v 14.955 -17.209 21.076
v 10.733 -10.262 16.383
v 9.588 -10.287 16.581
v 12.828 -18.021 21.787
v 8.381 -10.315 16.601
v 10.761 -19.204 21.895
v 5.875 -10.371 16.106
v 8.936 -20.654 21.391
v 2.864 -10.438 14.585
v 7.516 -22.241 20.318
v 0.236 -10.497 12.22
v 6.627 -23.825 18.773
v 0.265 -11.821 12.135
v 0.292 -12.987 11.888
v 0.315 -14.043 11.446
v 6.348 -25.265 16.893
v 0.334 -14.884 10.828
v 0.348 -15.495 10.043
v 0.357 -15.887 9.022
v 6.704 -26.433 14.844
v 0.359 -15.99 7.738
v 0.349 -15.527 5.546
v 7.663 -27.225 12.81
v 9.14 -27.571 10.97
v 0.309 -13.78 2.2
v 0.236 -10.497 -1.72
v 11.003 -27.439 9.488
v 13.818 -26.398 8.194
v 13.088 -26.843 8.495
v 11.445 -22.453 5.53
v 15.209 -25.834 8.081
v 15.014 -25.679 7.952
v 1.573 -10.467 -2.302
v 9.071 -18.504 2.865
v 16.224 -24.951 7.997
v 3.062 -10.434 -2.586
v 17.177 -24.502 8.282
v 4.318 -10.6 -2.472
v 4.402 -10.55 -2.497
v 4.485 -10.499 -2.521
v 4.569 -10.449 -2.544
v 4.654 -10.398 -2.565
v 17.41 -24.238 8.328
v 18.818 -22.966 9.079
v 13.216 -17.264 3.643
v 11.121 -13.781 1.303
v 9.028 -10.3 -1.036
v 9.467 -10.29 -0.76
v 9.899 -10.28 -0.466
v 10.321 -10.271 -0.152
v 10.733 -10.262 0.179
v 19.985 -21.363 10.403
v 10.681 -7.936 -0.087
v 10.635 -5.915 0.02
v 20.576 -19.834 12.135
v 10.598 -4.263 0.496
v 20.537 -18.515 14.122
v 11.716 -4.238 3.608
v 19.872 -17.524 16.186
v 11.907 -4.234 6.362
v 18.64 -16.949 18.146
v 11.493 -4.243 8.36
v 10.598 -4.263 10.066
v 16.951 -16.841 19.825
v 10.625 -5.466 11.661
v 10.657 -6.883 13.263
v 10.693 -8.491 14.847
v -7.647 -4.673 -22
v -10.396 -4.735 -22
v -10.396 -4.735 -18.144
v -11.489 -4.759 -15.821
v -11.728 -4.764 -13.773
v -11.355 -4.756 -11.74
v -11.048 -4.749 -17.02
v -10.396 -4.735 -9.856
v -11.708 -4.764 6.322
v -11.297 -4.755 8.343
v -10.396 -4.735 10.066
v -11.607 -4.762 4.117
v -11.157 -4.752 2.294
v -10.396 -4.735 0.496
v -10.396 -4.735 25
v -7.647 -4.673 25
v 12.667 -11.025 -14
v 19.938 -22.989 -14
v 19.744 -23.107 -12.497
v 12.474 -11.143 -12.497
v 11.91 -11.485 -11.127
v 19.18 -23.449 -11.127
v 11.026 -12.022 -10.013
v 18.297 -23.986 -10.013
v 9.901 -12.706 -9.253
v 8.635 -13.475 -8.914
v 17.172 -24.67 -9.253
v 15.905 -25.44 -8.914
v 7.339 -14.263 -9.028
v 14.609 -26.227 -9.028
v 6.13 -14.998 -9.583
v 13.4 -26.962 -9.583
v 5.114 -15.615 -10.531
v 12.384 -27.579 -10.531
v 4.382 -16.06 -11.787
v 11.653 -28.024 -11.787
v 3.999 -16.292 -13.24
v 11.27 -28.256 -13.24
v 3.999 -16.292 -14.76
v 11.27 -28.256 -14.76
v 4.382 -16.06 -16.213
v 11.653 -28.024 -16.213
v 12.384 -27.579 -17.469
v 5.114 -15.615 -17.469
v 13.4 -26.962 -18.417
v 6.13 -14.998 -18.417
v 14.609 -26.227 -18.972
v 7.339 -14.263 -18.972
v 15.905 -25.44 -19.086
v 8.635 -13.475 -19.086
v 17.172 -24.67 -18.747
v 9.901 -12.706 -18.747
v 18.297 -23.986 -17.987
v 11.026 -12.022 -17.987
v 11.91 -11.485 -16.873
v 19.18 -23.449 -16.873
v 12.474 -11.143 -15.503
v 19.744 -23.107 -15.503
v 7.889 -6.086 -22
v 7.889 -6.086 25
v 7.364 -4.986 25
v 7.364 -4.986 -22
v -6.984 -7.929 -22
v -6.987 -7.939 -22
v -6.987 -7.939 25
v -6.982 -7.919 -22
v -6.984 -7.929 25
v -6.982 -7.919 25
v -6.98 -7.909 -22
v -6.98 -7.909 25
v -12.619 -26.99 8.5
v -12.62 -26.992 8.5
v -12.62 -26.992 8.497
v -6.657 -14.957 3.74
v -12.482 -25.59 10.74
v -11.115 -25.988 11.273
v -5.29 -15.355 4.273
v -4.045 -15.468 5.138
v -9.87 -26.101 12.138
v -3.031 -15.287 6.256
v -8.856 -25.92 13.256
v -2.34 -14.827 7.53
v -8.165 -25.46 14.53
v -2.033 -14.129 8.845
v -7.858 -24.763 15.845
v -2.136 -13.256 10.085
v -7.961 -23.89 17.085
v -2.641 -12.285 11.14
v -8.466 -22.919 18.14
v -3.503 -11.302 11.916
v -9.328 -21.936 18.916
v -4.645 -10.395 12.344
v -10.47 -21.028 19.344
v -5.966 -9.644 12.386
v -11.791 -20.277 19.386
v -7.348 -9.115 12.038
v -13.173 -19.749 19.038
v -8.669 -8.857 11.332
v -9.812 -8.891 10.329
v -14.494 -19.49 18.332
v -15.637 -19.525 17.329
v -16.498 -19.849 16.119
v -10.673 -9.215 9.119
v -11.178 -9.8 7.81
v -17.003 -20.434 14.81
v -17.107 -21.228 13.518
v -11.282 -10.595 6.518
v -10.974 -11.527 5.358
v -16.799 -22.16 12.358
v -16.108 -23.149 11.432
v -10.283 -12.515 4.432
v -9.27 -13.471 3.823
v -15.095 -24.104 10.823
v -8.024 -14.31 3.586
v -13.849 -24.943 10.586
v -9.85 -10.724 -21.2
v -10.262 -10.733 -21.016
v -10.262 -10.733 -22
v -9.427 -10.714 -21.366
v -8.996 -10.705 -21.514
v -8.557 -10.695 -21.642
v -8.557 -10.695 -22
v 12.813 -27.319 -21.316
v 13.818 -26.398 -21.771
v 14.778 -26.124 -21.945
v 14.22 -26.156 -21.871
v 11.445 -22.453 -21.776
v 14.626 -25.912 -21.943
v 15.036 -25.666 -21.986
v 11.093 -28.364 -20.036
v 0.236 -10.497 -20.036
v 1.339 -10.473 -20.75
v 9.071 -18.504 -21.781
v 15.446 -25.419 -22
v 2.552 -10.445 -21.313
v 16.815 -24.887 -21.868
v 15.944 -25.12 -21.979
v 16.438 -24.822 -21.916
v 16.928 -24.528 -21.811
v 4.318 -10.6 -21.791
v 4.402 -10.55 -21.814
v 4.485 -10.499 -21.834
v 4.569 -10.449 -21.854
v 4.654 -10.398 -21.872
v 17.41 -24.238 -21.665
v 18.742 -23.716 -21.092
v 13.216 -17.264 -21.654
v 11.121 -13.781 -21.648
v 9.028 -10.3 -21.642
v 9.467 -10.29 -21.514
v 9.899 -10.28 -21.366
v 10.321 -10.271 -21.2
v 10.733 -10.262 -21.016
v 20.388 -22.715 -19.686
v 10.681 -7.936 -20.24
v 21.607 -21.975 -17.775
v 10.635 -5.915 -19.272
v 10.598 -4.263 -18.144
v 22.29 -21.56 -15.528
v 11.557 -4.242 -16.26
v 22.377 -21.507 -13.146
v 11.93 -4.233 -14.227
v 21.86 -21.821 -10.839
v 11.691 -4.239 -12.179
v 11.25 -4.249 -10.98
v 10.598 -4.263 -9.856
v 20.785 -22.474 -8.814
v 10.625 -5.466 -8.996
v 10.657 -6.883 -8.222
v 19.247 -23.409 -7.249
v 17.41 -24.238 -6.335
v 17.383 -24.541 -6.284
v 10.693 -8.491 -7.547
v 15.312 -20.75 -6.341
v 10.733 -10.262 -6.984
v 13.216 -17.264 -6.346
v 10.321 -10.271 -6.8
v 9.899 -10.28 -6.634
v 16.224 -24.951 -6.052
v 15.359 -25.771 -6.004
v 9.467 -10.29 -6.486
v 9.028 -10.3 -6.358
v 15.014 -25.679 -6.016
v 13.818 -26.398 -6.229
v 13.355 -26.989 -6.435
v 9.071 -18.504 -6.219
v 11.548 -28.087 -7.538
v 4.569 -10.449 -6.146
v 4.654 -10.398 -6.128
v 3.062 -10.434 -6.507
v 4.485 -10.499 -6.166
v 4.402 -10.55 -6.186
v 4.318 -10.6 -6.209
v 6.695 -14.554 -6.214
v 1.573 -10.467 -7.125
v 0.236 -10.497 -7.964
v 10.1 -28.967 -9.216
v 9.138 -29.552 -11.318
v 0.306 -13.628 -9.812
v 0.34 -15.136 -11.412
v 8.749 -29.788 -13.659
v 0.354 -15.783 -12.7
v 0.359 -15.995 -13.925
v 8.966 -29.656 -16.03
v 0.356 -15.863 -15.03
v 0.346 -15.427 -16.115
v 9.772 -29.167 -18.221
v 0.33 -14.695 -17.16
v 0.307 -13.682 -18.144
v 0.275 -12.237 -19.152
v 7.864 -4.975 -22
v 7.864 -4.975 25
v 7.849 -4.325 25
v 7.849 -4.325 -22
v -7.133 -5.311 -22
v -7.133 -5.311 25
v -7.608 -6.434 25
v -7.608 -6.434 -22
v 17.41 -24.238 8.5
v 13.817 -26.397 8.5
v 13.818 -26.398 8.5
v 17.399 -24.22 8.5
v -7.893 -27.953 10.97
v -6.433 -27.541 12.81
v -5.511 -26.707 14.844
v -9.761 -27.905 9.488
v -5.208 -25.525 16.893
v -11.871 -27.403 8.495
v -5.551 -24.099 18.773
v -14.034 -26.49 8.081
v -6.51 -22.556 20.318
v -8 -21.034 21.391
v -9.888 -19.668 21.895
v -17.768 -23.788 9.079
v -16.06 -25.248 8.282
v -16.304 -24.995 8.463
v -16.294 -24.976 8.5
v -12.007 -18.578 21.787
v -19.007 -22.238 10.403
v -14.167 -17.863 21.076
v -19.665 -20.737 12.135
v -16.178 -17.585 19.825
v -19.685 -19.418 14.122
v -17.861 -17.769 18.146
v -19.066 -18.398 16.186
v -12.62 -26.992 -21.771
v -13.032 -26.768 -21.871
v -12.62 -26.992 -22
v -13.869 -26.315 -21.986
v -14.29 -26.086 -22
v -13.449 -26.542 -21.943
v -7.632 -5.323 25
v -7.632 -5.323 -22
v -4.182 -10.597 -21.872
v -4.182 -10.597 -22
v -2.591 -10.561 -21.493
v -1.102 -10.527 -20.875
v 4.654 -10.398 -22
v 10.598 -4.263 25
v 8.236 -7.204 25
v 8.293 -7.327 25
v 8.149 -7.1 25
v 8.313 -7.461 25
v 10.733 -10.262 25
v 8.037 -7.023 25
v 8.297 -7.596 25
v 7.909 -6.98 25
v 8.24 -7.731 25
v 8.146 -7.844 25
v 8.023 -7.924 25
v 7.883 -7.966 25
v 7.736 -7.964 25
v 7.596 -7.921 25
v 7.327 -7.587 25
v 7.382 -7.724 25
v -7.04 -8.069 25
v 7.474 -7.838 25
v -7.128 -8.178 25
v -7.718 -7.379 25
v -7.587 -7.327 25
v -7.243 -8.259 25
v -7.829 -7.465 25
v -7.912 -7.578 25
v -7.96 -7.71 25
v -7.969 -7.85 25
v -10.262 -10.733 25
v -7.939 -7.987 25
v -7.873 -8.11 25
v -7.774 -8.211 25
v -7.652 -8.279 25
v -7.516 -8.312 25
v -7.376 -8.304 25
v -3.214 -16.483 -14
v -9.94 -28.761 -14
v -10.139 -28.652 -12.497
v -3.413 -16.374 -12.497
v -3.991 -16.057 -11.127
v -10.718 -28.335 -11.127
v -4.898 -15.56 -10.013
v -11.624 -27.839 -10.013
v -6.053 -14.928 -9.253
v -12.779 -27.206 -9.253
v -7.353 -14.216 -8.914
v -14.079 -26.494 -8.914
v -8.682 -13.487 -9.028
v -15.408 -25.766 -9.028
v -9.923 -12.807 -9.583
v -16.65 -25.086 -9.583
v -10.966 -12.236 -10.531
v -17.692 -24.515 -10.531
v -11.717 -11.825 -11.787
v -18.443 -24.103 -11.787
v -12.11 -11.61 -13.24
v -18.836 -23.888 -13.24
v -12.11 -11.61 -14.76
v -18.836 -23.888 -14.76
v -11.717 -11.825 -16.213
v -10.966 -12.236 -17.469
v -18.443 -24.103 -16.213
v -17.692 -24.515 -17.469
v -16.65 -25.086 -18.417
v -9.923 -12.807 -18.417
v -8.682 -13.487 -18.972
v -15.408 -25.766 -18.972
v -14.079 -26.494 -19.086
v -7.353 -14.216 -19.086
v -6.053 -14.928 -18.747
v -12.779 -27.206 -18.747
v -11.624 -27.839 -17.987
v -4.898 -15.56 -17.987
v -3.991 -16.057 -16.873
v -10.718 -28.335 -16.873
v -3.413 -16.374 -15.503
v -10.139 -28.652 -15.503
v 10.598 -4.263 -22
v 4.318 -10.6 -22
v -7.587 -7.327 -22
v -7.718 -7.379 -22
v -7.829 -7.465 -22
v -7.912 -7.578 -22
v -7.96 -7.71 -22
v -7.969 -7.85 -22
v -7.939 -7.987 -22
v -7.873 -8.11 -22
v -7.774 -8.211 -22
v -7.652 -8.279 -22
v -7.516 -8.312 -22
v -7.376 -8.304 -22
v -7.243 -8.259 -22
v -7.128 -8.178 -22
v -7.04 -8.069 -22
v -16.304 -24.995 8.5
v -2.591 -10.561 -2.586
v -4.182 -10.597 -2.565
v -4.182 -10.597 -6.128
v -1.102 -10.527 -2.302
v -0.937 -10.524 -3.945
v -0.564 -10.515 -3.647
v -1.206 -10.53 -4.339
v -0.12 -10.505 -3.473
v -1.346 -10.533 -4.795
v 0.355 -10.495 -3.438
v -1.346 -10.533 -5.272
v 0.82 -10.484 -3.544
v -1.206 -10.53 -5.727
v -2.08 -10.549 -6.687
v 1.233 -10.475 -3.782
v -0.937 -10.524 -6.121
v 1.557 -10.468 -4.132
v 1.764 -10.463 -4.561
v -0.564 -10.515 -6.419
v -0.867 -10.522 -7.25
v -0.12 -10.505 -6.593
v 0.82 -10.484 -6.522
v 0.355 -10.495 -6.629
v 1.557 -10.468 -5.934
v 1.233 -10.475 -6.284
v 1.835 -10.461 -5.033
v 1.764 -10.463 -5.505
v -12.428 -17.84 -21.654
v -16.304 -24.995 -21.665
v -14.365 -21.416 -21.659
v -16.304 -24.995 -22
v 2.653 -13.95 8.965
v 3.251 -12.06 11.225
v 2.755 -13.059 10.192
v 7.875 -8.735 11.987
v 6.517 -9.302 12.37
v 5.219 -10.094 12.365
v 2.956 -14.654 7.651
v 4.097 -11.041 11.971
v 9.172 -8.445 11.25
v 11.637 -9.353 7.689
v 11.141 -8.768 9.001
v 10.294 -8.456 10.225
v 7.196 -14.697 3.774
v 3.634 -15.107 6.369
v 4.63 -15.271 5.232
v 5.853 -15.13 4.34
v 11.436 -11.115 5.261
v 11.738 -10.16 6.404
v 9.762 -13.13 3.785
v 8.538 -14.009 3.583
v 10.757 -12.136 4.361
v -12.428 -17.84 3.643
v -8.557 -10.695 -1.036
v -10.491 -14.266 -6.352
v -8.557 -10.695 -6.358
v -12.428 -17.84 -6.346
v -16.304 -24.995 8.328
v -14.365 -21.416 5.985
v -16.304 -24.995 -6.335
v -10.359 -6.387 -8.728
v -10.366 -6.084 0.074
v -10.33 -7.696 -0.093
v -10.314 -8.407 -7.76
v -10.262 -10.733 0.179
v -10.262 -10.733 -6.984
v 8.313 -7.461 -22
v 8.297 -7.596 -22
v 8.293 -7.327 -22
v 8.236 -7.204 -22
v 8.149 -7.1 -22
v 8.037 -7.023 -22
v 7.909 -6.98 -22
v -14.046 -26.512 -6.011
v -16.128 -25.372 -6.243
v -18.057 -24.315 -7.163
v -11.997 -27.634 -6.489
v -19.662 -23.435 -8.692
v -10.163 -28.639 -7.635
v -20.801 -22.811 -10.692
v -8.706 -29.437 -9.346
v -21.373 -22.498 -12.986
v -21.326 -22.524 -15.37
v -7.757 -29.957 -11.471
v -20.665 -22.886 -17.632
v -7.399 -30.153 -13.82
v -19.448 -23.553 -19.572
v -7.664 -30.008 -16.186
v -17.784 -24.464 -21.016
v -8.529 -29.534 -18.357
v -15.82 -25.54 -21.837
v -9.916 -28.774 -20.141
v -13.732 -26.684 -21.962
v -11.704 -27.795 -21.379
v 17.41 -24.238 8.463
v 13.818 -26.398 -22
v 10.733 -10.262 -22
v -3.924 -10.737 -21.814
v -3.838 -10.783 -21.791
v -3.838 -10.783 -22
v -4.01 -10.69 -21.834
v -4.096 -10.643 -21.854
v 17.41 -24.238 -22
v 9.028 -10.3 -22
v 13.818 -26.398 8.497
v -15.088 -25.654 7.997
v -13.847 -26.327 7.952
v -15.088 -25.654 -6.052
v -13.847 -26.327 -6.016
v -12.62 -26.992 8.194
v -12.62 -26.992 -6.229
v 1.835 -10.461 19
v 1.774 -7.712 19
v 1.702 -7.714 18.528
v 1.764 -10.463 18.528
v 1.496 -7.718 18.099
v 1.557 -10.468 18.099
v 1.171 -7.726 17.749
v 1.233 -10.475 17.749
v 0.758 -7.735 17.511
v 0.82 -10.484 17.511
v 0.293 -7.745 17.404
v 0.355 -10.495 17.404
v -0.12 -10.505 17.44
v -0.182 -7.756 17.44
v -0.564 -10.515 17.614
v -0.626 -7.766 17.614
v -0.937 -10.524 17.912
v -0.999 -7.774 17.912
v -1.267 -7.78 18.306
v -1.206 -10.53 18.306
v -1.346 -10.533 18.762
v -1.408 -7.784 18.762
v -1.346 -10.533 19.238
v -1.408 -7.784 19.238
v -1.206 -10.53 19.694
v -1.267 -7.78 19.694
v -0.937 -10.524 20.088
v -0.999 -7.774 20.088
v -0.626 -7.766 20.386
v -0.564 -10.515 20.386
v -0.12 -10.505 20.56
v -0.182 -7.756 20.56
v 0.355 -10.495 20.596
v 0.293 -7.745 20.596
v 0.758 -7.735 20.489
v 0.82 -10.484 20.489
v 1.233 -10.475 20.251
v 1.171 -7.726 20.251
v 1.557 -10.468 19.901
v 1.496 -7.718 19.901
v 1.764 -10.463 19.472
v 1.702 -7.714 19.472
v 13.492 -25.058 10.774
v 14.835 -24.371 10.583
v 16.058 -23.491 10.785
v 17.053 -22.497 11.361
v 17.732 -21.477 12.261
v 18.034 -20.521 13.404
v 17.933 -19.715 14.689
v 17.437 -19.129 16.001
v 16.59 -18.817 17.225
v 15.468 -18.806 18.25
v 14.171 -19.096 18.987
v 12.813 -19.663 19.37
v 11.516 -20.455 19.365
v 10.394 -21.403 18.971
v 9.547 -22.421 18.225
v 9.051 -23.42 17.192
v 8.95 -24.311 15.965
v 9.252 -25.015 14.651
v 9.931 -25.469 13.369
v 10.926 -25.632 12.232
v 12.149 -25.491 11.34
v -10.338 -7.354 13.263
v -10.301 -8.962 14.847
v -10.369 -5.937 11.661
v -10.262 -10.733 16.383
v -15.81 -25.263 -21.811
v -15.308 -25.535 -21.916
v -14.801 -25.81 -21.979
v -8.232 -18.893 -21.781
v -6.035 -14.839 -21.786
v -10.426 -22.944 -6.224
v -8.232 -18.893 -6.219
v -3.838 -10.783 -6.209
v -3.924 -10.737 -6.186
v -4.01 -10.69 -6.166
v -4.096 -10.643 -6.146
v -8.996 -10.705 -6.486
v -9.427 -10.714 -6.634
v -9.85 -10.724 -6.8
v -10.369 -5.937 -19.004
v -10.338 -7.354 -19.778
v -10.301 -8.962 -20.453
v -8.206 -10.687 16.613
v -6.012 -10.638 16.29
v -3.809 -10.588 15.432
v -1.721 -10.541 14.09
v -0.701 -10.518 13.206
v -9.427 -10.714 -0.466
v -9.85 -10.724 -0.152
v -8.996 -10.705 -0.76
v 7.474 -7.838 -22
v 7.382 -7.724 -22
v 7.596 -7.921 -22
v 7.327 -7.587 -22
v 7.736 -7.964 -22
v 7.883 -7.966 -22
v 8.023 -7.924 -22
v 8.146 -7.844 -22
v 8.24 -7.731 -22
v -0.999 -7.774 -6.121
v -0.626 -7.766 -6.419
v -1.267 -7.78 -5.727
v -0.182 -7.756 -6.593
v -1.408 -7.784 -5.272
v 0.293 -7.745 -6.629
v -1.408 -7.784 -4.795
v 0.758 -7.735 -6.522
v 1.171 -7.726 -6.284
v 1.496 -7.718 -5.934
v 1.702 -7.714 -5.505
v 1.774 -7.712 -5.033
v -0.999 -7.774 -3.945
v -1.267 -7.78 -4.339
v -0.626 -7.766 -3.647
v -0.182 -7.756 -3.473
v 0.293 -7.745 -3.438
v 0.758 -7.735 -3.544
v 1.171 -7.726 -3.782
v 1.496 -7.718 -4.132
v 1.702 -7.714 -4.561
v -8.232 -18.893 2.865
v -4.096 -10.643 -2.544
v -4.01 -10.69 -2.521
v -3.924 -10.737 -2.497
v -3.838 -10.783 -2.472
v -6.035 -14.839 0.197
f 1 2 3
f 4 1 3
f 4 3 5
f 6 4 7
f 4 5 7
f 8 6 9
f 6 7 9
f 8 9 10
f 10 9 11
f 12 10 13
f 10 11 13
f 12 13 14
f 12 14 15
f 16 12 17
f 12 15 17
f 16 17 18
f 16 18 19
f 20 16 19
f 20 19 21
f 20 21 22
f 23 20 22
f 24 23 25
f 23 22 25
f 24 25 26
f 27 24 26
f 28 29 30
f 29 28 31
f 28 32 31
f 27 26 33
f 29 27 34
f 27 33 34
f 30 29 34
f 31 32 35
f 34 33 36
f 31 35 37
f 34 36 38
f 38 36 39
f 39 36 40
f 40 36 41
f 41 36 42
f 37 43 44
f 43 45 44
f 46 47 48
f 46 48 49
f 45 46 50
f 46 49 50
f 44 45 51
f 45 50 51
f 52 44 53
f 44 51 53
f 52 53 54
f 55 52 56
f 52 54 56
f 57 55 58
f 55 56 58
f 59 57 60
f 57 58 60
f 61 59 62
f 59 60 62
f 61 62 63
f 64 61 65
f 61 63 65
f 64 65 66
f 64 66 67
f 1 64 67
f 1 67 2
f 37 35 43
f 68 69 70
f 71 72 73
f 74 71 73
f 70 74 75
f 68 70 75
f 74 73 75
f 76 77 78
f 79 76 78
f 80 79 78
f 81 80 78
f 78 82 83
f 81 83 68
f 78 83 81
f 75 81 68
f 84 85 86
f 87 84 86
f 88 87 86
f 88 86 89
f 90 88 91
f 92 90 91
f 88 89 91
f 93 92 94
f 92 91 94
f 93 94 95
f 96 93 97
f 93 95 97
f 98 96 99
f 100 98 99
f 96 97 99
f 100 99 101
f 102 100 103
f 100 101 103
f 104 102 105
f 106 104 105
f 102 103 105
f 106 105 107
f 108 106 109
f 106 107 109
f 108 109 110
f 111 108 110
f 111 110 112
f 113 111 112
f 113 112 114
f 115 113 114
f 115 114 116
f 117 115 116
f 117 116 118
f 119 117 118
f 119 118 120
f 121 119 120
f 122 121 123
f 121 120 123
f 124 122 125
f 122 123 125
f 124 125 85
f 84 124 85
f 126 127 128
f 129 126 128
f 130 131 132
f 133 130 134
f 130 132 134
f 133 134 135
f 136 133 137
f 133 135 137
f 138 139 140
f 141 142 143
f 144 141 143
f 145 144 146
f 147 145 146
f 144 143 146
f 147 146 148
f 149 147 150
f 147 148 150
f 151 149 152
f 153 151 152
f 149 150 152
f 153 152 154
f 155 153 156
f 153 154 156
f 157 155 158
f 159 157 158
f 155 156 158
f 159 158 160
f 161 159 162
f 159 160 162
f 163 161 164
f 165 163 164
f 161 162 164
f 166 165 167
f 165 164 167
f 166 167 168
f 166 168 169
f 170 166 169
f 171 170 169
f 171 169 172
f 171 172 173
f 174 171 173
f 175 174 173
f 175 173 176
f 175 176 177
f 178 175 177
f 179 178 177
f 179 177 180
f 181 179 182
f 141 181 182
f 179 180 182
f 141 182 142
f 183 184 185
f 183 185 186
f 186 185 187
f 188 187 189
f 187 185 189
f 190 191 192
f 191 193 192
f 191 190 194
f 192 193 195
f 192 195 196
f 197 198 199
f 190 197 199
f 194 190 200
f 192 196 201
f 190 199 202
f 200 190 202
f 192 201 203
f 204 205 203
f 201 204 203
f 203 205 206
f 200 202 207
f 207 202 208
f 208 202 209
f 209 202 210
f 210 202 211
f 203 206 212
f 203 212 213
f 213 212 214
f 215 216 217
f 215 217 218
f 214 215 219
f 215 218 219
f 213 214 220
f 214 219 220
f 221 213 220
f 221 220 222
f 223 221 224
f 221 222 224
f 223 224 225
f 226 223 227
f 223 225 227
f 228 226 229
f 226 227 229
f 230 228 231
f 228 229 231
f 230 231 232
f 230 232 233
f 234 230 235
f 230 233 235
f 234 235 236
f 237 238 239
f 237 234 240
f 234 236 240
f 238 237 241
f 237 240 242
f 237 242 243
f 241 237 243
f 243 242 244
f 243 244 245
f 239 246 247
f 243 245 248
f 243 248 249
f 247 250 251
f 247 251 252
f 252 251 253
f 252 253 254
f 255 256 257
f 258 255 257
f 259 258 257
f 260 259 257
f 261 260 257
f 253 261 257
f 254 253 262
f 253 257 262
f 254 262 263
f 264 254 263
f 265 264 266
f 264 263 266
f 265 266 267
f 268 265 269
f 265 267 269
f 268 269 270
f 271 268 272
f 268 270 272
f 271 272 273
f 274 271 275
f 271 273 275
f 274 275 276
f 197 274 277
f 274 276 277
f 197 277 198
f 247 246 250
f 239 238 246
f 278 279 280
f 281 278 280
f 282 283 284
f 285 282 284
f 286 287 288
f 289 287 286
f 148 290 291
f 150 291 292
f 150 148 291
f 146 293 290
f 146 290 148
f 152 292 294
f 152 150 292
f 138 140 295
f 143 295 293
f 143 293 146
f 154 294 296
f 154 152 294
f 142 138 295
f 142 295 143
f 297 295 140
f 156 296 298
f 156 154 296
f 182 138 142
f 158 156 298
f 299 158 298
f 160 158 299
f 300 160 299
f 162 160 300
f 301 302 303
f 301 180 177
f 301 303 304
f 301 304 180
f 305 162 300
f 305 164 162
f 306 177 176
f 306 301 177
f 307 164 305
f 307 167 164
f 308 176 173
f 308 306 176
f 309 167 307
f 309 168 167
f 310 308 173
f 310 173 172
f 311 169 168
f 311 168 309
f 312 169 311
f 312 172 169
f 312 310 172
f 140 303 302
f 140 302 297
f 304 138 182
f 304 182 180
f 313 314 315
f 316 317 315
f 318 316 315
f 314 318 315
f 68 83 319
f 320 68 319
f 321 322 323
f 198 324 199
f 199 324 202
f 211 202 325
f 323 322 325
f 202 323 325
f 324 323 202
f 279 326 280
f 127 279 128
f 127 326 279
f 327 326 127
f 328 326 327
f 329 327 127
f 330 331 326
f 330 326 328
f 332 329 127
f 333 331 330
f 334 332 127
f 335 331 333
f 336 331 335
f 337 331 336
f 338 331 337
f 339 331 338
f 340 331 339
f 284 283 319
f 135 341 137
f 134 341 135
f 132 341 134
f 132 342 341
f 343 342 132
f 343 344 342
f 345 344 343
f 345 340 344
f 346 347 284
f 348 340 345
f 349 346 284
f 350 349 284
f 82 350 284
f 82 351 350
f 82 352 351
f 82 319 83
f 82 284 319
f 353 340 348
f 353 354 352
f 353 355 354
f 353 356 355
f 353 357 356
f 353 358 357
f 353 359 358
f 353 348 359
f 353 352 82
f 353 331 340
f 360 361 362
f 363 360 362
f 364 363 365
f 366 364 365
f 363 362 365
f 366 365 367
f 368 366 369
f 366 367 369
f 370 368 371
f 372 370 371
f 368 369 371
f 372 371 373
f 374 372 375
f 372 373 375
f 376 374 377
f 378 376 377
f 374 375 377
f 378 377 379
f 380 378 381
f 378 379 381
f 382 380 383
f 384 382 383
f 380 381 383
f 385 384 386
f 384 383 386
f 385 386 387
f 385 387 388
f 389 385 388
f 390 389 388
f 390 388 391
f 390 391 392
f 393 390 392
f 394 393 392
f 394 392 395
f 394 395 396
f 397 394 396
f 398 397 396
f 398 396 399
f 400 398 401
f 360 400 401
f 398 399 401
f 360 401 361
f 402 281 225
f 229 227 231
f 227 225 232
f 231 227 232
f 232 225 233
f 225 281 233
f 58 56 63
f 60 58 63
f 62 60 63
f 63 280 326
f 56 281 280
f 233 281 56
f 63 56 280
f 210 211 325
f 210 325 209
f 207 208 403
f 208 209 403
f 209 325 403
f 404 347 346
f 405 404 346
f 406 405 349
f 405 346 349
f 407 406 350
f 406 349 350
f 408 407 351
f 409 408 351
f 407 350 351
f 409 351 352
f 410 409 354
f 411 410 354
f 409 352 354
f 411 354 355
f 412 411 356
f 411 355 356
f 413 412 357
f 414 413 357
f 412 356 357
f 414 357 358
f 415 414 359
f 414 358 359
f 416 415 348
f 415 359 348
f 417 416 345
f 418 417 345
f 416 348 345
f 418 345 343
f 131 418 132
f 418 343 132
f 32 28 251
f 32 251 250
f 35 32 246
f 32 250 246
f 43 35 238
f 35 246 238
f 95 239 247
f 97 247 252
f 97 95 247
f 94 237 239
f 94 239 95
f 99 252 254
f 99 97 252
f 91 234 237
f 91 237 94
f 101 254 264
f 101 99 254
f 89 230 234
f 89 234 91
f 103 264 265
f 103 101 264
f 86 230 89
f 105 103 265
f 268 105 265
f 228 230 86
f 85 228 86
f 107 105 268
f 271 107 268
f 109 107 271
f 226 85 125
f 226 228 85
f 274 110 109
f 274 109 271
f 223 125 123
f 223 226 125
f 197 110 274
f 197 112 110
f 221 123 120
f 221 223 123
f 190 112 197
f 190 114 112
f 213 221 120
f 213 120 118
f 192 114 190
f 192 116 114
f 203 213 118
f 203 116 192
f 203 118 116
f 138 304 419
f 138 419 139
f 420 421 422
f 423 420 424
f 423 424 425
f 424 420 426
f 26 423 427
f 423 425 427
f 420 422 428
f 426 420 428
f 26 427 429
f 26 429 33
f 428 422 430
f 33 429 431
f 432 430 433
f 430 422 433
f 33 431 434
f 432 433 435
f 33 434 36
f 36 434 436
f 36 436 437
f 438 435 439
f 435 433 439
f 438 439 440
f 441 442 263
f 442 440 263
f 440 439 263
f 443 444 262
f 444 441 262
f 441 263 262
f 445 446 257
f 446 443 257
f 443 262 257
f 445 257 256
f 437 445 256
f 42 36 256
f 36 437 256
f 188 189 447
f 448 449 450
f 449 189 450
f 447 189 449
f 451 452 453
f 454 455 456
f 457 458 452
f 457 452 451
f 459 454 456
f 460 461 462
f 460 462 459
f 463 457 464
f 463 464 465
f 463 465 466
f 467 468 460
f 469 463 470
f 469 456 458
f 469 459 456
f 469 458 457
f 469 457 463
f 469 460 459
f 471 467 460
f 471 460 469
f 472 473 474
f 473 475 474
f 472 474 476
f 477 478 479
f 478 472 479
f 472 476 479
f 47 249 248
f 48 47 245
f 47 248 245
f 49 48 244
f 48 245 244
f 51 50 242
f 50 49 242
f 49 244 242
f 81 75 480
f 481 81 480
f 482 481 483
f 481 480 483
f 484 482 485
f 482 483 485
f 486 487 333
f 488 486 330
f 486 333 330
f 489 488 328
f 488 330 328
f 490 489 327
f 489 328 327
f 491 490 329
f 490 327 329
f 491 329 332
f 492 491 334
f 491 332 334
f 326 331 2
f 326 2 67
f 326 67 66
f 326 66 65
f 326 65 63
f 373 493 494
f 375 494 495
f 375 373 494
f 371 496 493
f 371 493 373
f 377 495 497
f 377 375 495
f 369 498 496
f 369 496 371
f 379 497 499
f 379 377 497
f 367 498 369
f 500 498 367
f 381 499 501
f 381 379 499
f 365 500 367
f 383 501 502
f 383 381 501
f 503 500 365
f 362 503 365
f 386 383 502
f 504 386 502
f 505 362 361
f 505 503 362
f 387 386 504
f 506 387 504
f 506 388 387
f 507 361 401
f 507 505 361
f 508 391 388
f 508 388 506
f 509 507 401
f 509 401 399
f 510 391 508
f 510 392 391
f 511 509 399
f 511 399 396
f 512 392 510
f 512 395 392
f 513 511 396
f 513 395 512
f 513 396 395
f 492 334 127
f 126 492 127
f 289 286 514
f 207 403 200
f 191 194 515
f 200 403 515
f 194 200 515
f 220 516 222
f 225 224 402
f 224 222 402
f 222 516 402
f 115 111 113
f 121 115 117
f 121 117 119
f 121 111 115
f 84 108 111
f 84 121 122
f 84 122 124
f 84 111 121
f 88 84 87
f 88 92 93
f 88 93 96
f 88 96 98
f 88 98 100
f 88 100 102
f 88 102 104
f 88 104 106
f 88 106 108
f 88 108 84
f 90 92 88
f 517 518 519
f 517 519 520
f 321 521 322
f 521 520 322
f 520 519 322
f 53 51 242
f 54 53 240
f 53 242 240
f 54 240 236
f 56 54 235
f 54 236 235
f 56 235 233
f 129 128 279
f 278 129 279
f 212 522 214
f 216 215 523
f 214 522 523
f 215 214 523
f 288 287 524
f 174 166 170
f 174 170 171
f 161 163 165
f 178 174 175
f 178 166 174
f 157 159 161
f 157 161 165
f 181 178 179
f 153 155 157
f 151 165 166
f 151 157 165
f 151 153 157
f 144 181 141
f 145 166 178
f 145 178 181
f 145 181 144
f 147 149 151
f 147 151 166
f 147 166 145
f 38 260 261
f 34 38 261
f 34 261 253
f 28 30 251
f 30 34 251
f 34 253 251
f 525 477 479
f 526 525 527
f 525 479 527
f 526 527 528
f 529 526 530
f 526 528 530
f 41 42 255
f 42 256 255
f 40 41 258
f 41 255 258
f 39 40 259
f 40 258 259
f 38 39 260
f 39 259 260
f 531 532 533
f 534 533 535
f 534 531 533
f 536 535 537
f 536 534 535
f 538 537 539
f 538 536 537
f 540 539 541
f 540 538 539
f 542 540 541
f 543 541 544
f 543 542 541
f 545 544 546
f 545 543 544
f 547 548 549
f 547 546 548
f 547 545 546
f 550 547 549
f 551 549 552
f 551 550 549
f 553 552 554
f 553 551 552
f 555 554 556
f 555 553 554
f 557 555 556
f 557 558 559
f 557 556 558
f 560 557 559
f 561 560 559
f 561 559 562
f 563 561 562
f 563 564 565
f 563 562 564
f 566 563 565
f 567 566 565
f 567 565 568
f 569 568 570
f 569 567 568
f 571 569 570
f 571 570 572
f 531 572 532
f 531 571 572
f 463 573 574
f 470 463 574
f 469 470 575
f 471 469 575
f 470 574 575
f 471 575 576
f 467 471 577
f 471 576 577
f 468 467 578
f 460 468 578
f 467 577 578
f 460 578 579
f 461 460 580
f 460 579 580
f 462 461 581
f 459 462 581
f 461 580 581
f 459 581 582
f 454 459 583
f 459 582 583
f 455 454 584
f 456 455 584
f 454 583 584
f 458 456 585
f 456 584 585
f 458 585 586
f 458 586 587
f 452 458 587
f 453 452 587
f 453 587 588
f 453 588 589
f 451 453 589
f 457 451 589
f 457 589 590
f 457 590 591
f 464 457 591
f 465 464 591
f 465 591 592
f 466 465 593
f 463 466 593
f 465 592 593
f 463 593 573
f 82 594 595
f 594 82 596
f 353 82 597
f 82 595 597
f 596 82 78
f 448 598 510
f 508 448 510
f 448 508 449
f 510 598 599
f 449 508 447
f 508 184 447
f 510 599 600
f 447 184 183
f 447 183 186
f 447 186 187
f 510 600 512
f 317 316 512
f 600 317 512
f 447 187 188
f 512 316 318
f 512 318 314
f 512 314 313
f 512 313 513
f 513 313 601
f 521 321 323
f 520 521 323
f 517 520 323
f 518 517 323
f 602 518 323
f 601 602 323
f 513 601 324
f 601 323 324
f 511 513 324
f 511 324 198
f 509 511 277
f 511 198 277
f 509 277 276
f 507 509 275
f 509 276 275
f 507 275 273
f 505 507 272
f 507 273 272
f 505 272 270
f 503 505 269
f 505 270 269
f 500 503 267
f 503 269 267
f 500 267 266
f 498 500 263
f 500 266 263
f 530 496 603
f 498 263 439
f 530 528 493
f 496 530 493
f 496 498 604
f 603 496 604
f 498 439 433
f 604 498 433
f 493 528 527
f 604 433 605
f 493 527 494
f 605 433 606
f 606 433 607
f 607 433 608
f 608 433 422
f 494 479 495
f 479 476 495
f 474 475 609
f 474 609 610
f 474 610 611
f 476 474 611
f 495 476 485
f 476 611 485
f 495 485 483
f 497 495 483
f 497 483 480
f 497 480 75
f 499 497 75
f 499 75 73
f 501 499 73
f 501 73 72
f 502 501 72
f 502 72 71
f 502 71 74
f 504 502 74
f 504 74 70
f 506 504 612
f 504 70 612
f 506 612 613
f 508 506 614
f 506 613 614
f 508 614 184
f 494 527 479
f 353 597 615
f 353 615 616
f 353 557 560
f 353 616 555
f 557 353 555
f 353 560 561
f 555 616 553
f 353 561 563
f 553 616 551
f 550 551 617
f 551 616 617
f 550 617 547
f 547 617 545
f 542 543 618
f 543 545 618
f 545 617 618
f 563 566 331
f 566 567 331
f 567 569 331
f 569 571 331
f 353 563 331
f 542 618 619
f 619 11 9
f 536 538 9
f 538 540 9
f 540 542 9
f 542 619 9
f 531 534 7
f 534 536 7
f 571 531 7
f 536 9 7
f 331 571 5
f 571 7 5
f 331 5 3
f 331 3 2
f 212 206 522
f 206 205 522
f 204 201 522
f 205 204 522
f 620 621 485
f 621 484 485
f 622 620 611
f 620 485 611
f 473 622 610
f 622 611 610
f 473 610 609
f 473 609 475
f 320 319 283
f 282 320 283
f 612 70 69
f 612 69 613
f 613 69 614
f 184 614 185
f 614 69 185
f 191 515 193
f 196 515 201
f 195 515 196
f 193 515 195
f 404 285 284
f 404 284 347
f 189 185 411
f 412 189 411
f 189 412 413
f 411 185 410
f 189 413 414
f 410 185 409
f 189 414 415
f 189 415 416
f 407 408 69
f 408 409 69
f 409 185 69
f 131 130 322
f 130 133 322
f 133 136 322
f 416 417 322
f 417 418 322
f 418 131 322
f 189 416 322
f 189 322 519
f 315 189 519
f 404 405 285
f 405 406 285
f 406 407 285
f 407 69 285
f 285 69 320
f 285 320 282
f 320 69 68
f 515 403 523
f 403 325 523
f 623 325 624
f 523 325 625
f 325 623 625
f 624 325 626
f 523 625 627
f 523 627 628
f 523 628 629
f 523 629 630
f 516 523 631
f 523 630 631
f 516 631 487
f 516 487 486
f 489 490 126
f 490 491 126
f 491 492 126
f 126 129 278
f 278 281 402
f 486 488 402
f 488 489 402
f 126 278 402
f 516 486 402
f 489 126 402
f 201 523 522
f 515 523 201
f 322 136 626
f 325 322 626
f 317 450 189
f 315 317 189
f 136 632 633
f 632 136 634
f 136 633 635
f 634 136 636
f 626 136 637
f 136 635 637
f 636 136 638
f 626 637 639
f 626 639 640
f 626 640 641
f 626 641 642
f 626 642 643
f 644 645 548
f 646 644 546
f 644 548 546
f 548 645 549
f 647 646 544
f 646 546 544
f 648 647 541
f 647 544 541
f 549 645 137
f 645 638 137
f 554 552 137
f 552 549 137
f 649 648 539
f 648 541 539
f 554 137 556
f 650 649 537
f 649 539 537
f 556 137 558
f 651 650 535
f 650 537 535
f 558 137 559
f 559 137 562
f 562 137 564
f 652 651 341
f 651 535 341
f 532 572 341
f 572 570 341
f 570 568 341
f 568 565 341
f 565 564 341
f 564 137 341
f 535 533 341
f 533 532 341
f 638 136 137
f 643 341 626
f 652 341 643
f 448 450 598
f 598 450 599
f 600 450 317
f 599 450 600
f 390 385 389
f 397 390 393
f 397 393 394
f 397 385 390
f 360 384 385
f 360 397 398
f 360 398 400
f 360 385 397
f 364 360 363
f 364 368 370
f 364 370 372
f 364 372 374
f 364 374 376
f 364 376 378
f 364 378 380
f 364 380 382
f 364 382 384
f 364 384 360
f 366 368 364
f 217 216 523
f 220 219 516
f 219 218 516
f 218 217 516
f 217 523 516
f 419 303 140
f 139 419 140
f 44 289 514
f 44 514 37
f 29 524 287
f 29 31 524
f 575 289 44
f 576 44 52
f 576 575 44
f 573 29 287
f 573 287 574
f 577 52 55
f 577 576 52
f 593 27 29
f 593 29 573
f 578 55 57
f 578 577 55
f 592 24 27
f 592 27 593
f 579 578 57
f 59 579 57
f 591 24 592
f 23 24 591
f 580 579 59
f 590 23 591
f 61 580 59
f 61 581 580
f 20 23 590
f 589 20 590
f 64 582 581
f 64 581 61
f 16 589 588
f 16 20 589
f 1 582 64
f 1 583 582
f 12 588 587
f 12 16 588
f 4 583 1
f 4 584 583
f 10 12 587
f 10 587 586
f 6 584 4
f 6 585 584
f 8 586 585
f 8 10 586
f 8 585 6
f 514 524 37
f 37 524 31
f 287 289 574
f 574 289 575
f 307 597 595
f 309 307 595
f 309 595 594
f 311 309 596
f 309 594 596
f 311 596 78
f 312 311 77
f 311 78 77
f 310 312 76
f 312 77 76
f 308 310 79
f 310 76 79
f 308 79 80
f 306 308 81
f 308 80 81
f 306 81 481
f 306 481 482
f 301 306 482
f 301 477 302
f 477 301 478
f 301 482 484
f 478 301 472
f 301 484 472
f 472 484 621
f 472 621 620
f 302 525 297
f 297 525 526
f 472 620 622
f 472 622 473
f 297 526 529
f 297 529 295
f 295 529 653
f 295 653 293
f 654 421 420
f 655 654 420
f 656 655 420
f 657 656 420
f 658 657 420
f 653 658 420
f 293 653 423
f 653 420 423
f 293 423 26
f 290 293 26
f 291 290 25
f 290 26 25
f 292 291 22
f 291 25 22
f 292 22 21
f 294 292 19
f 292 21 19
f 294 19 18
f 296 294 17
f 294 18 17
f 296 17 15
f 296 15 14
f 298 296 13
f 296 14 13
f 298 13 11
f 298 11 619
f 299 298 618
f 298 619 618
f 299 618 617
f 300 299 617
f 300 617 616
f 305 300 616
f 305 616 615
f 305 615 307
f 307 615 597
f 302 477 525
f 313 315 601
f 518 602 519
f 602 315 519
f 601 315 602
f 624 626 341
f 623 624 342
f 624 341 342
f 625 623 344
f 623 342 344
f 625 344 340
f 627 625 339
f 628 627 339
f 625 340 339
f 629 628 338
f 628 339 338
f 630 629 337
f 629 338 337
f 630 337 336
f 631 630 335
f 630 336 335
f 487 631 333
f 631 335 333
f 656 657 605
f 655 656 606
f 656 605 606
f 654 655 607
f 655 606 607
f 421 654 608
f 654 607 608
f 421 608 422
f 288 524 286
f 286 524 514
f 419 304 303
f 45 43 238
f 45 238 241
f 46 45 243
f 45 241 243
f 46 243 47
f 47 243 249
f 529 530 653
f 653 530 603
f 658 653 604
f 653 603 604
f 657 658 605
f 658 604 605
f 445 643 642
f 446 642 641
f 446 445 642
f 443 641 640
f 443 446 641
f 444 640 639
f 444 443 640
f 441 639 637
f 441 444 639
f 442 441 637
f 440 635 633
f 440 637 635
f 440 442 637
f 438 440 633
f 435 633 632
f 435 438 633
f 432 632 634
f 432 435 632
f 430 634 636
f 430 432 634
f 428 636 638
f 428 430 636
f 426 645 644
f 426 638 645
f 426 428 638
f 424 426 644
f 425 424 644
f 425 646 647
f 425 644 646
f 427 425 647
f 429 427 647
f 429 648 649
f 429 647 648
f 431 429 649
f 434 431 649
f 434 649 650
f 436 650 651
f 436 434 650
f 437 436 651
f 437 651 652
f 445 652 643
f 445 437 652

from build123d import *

# Parameters (mm, degrees)
BOSS_EXTRUDE1_DEPTH      = 25
BOSS_EXTRUDE1_DEPTH_BACK = 22
SKETCH5_R                = 8
BOSS_EXTRUDE2_DEPTH      = 30
SKETCH6_R                = 8
BOSS_EXTRUDE3_DEPTH      = 30
SKETCH18_R               = 8
BOSS_EXTRUDE4_DEPTH      = 30
SKETCH19_R               = 8
BOSS_EXTRUDE5_DEPTH      = 30
SKETCH11_R               = 0.5
CUT_EXTRUDE4_DEPTH       = 61.172763276
CUT_EXTRUDE5_REACH       = 41.594
SKETCH12_R               = 1.6
TOPCUT_DEPTH             = 61.172763276
GRABTABS_DEPTH           = 47
BOSS_EXTRUDE6_DEPTH      = 30.5
SKETCH22_R               = 5.1
CUT_EXTRUDE6_DEPTH       = 14
SKETCH23_R               = 5.1
CUT_EXTRUDE7_DEPTH       = 14
SKETCH20_R               = 5.1
CUT_EXTRUDE8_DEPTH       = 14
SKETCH21_R               = 5.1
CUT_EXTRUDE9_DEPTH       = 14


with BuildPart() as part:
    # Sketch3 → Boss-Extrude1 (new, two sides: drawn at the far end of the back side and taken through both)
    with BuildSketch(Plane(origin=(0, 0, 0), x_dir=(-0.9678879191476432, 0.2513821313618881, 0), z_dir=(0, 0, 1)).offset(-BOSS_EXTRUDE1_DEPTH_BACK)):
        Polygon((-7.234103595, -12.967950693), (12.967950693, -7.234103595), (7.234103595, 12.967950693), (-12.967950693, 7.234103595), align=None)
    extrude(amount=BOSS_EXTRUDE1_DEPTH + BOSS_EXTRUDE1_DEPTH_BACK)

    # Sketch5 → Boss-Extrude2 (add)
    with BuildSketch(Plane(origin=(0, 0, 0), x_dir=(-0.7398893525523432, -0.6222846190478576, -0.2555887299474237), z_dir=(0.4497352826512201, -0.740093355961685, 0.499999999999998))):
        with Locations(Location((0, 0, 0), (0, 0, 224.122685504))):
            Circle(SKETCH5_R)
    extrude(amount=BOSS_EXTRUDE2_DEPTH)

    # Sketch6 → Boss-Extrude3 (add)
    with BuildSketch(Plane(origin=(0, 0, 0), x_dir=(-0.7035639492311271, 0.6172392366079582, 0.3521554970945721), z_dir=(-0.4160720061092844, -0.7595288577349761, 0.499999999999998))):
        with Locations(Location((0, 0, 0), (0, 0, 322.705646398))):
            Circle(SKETCH6_R)
    extrude(amount=BOSS_EXTRUDE3_DEPTH)

    # Sketch18 → Boss-Extrude4 (add)
    with BuildSketch(Plane(origin=(0, 0, -14), x_dir=(-0.8770283809411537, 0.48043856945892555, 0), z_dir=(-0.4804385694589255, -0.8770283809411535, 0))):
        with Locations(Location((0, 0, 0), (0, 0, 61.287925102))):
            Circle(SKETCH18_R)
    extrude(amount=BOSS_EXTRUDE4_DEPTH)

    # Sketch19 → Boss-Extrude5 (add)
    with BuildSketch(Plane(origin=(0, 0, -14), x_dir=(-0.8545861965798597, -0.5193095730055144, 0), z_dir=(0.5193095730055143, -0.8545861965798596, 0))):
        with Locations(Location((0, 0, 0), (0, 0, 48.985500334))):
            Circle(SKETCH19_R)
    extrude(amount=BOSS_EXTRUDE5_DEPTH)

    # Sketch11 → Cut-Extrude4 (cut, through all)
    with BuildSketch(Plane(origin=(0, 0, 25), x_dir=(0.967887919147643, -0.25138213136188803, 0), z_dir=(0, 0, 1))):
        with BuildLine():
            ThreePointArc((-4.766381934, -9.44058657), (-4.766628372, -9.424890171), (-4.767367442, -9.409209245))
            Line((-4.767367442, -9.409209245), (-5.339457415, -9.571582654))
            Line((-5.339457415, -9.571582654), (-5.501830825, -8.999492681))
            ThreePointArc((-5.501830825, -8.999492681), (-5.523554594, -9.869378155), (-4.766381934, -9.44058657))
        make_face()
        with BuildLine():
            Line((-5.339457415, -9.571582654), (-4.767367442, -9.409209245))
            ThreePointArc((-4.767367442, -9.409209245), (-5.022796995, -9.003932957), (-5.501830825, -8.999492681))
            Line((-5.501830825, -8.999492681), (-5.339457415, -9.571582654))
        make_face()
        with BuildLine():
            Line((8.999492681, -5.501830825), (9.571582654, -5.339457415))
            Line((9.571582654, -5.339457415), (9.409209245, -4.767367442))
            ThreePointArc((9.409209245, -4.767367442), (9.003932957, -5.022796995), (8.999492681, -5.501830825))
        make_face()
        with BuildLine():
            Line((9.409209245, -4.767367442), (9.571582654, -5.339457415))
            Line((9.571582654, -5.339457415), (8.999492681, -5.501830825))
            ThreePointArc((8.999492681, -5.501830825), (9.561939475, -5.751431903), (9.94058657, -5.266381934))
            ThreePointArc((9.94058657, -5.266381934), (9.782866673, -4.901903771), (9.409209245, -4.767367442))
        make_face()
        with Locations((-5.266381934, -9.44058657)):
            Circle(SKETCH11_R)
        with Locations((9.44058657, -5.266381934)):
            Circle(SKETCH11_R)
        Polygon((-5.339457415, -9.571582654), (9.571582654, -5.339457415), (5.339457415, 9.571582654), (-9.571582654, 5.339457415), align=None)
    extrude(amount=-CUT_EXTRUDE4_DEPTH, mode=Mode.SUBTRACT)

    # Sketch12 → Cut-Extrude5 (cut, up to next)
    with BuildSketch(Plane(origin=(0.235642936, -10.497355496, 0), x_dir=(0.07428415697149086, 0.0016675187230335104, -0.9972357210832067), z_dir=(-0.02244218436129408, 0.9997481424644377, 0)), mode=Mode.PRIVATE) as cut_extrude5_sk1:
        with Locations(Location((-18.947478701, -1.411754543, 0), (0, 0, 274.261167974))):
            Circle(SKETCH12_R)
    cut_extrude5_tool1 = extrude(cut_extrude5_sk1.sketch, amount=CUT_EXTRUDE5_REACH, mode=Mode.PRIVATE) & part.part
    # Sketch12 → Cut-Extrude5 (cut, up to next)
    with BuildSketch(Plane(origin=(0.235642936, -10.497355496, 0), x_dir=(0.07428415697149086, 0.0016675187230335104, -0.9972357210832067), z_dir=(-0.02244218436129408, 0.9997481424644377, 0)), mode=Mode.PRIVATE) as cut_extrude5_sk2:
        with Locations(Location((5.019164388, 0.373972086, 0), (0, 0, 274.261167974))):
            Circle(SKETCH12_R)
    cut_extrude5_tool2 = extrude(cut_extrude5_sk2.sketch, amount=CUT_EXTRUDE5_REACH, mode=Mode.PRIVATE) & part.part
    add(cut_extrude5_tool1.solids().sort_by_distance((0.235643, -10.497355, 19))[0], mode=Mode.SUBTRACT)
    add(cut_extrude5_tool2.solids().sort_by_distance((0.235643, -10.497355, -5.033077))[0], mode=Mode.SUBTRACT)

    # Sketch14 → TopCut (cut, through all)
    with BuildSketch(Plane.XY.offset(25)):
        Polygon((-31.105779731, -5.199391149), (38.352697692, -3.640198499), (37.988721129, 12.574127466), (-33.745248602, 10.963854933), align=None)
    extrude(amount=-TOPCUT_DEPTH, mode=Mode.SUBTRACT)

    # Sketch17 → GrabTabs (add, through all)
    with BuildSketch(Plane(origin=(0, 0, 25), x_dir=(-1, 0, 0), z_dir=(0, 0, -1))):
        Polygon((7.132596783, -5.31140877), (7.607527123, -6.433816222), (7.632470855, -5.322629862), align=None)
        Polygon((-7.888569085, -6.085962364), (-7.363751282, -4.985997097), (-7.863625354, -4.974776005), align=None)
    extrude(amount=GRABTABS_DEPTH)

    # Sketch24 → Boss-Extrude6 (add)
    with BuildSketch(Plane(origin=(0, 0, -22), x_dir=(-1, 0, 0), z_dir=(0, 0, -1))):
        Polygon((-13.818067506, -26.398167405), (-17.409683037, -24.238344439), (-7.909513608, -8.440310713), (-4.317898077, -10.60013368), align=None)
        Polygon((3.837888164, -10.783213448), (7.522803724, -8.786732873), (16.304497418, -24.9951549), (12.619581859, -26.991635476), align=None)
    extrude(amount=-BOSS_EXTRUDE6_DEPTH)

    # Sketch22 → Cut-Extrude6 (cut)
    with BuildSketch(Plane(origin=(-14.413157084, -26.310851428, 0), x_dir=(0.8770283809411535, -0.48043856945892577, 0), z_dir=(-0.4804385694589257, -0.8770283809411534, 0))):
        with Locations((0, -14)):
            Circle(SKETCH22_R)
    extrude(amount=-CUT_EXTRUDE6_DEPTH, mode=Mode.SUBTRACT)

    # Sketch23 → Cut-Extrude7 (cut)
    with BuildSketch(Plane(origin=(-12.482160183, -22.785865732, 15), x_dir=(0.9093316698170122, -0.34752852674676815, 0.22877901425835656), z_dir=(-0.41607200610928446, -0.7595288577349762, 0.4999999999999979))):
        with Locations(Location((0, 0, 0), (0, 0, 270))):
            Circle(SKETCH23_R)
    extrude(amount=-CUT_EXTRUDE7_DEPTH, mode=Mode.SUBTRACT)

    # Sketch20 → Cut-Extrude8 (cut)
    with BuildSketch(Plane(origin=(13.49205848, -22.202800679, 15), x_dir=(-0.893161897719908, -0.37266042750079065, 0.2517658242023739), z_dir=(0.44973528265122, -0.7400933559616851, 0.49999999999999784))):
        with Locations(Location((0, 0, 0), (0, 0, 90))):
            Circle(SKETCH20_R)
    extrude(amount=-CUT_EXTRUDE8_DEPTH, mode=Mode.SUBTRACT)

    # Sketch21 → Cut-Extrude9 (cut)
    with BuildSketch(Plane(origin=(15.57928719, -25.637585897, 0), x_dir=(0.8545861965798595, 0.5193095730055145, 0), z_dir=(0.5193095730055145, -0.8545861965798595, 0))):
        with Locations((0, -14)):
            Circle(SKETCH21_R)
    extrude(amount=-CUT_EXTRUDE9_DEPTH, mode=Mode.SUBTRACT)


solid = part.part
